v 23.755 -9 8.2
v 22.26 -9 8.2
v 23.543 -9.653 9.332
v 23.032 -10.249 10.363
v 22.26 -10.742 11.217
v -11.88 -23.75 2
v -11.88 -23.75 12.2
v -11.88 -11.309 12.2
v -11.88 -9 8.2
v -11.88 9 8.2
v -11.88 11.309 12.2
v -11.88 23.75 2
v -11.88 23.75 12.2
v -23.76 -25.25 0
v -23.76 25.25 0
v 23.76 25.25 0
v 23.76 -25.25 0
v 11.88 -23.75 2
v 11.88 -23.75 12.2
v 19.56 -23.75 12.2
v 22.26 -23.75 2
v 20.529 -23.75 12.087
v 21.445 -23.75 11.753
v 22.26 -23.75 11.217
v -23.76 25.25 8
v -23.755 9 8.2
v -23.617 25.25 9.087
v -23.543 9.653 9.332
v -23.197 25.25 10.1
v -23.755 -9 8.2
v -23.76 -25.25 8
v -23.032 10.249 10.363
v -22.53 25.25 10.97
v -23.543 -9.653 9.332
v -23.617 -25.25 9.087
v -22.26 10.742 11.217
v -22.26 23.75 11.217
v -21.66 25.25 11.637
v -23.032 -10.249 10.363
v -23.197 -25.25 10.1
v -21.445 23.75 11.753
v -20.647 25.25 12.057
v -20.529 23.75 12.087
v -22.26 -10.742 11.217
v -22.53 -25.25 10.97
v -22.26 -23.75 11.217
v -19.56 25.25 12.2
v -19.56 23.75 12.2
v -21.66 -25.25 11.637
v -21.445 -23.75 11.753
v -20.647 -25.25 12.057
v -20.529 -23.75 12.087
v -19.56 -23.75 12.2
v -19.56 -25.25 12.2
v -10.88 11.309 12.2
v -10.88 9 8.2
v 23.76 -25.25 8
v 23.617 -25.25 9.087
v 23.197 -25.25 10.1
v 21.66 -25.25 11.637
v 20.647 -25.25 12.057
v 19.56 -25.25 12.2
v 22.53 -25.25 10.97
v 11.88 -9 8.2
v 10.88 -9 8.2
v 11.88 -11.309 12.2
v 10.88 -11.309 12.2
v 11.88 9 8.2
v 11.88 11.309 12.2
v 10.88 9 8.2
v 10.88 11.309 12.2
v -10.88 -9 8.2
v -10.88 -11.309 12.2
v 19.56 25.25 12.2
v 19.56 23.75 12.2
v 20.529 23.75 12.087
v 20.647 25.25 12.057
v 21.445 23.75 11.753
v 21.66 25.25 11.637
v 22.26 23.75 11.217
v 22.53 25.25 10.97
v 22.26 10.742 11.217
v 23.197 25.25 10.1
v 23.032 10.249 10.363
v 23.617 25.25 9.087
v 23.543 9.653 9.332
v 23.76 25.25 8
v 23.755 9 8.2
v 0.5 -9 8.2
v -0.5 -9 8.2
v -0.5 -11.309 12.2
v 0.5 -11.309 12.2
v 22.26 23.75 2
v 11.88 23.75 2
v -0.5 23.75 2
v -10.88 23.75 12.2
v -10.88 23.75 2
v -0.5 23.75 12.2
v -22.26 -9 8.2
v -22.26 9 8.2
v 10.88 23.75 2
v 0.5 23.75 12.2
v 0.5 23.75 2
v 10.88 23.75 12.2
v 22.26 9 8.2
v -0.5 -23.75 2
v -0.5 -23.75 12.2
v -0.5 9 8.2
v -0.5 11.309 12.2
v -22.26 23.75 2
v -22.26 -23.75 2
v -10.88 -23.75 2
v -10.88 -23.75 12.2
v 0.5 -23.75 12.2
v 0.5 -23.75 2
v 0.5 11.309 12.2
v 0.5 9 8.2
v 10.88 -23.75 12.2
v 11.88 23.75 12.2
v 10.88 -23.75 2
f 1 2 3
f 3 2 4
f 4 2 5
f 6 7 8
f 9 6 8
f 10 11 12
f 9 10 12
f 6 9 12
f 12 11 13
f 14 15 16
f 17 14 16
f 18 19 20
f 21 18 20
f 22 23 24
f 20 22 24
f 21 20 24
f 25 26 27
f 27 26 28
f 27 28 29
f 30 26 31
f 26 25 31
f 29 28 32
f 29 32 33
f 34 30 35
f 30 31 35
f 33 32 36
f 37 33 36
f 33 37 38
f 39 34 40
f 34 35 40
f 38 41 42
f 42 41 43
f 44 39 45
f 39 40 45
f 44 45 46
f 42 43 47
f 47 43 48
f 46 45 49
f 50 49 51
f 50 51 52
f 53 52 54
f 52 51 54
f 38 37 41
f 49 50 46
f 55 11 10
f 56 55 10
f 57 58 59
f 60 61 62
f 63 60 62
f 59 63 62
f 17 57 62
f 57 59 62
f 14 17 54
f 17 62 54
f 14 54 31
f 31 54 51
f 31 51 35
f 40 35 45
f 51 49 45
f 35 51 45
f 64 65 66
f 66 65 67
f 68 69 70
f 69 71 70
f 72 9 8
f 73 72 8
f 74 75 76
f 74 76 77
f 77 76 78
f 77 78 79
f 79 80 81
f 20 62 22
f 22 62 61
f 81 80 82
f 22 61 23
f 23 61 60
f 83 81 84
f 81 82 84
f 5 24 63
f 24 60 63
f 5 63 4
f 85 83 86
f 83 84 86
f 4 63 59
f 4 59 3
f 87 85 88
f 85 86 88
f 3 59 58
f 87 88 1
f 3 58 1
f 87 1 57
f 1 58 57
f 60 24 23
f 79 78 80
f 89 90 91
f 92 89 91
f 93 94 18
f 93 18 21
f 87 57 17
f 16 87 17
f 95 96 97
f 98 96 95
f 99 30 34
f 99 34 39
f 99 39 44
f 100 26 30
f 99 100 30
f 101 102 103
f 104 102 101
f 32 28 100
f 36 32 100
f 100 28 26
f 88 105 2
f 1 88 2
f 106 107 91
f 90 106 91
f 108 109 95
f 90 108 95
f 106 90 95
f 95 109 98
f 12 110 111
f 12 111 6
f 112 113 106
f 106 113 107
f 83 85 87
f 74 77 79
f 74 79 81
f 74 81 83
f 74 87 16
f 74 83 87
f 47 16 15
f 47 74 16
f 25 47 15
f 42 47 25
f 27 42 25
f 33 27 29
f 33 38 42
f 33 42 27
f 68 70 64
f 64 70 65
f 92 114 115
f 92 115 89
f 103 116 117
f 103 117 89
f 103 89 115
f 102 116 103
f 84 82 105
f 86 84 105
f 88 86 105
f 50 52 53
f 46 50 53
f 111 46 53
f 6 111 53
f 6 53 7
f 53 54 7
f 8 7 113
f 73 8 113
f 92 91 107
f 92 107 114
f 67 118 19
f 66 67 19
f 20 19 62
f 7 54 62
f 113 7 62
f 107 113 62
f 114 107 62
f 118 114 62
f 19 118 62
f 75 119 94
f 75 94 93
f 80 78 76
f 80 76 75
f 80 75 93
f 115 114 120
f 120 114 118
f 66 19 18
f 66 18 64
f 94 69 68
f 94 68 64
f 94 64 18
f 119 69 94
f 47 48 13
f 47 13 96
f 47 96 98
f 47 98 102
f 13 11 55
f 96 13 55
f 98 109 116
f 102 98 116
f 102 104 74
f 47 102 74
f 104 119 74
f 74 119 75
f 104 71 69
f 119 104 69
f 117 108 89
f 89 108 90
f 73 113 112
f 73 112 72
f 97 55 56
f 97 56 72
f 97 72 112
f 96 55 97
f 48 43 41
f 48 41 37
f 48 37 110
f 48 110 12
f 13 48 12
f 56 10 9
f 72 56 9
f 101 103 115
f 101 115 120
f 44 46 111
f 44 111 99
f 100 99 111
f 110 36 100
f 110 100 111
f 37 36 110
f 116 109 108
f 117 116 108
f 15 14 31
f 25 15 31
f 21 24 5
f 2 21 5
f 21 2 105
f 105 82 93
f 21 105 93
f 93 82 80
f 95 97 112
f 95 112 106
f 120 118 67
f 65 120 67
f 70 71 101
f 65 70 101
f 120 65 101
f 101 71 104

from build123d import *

# Parameters (mm, degrees)
SKETCH1_W               = 47.52
SKETCH1_H               = 50.5
BOSS_EXTRUDE1_DEPTH     = 2
BOSS_EXTRUDE2_DEPTH     = 50.5
SKETCH3_W               = 10.38
SKETCH3_H               = 47.5
CUT_EXTRUDE1_DEPTH      = 10.2
CUT_EXTRUDE2_DEPTH      = 37.755137056
CUT_EXTRUDE2_DEPTH_BACK = 37.755137056


with BuildPart() as part:
    # Sketch1 → Boss-Extrude1 (new body)
    with BuildSketch(Plane.XY):
        Rectangle(SKETCH1_W, SKETCH1_H)
    extrude(amount=BOSS_EXTRUDE1_DEPTH)

    # Sketch2 → Boss-Extrude2 (add)
    with BuildSketch(Plane.XZ.offset(25.25)):
        with BuildLine():
            Line((-19.56, 12.2), (19.56, 12.2))
            ThreePointArc((19.56, 12.2), (22.529848481, 10.969848481), (23.76, 8))
            Line((23.76, 8), (23.76, 2))
            Line((23.76, 2), (-23.76, 2))
            Line((-23.76, 2), (-23.76, 8))
            ThreePointArc((-23.76, 8), (-22.529848481, 10.969848481), (-19.56, 12.2))
        make_face()
    extrude(amount=-BOSS_EXTRUDE2_DEPTH)

    # Sketch3 → Cut-Extrude1 (cut)
    with BuildSketch(Plane.XY.offset(12.2)):
        with Locations((-17.07, 0)):
            Rectangle(SKETCH3_W, SKETCH3_H)
        with Locations((-5.69, 0)):
            Rectangle(SKETCH3_W, SKETCH3_H)
        with Locations((5.69, 0)):
            Rectangle(SKETCH3_W, SKETCH3_H)
        with Locations((17.07, 0)):
            Rectangle(SKETCH3_W, SKETCH3_H)
    extrude(amount=-CUT_EXTRUDE1_DEPTH, mode=Mode.SUBTRACT)

    # Sketch4 → Cut-Extrude2 (cut, two sides: drawn at the far end of the back side and taken through both)
    with BuildSketch(Plane(origin=(0, 0, 0), x_dir=(0, 0, -1), z_dir=(1, 0, 0)).offset(-CUT_EXTRUDE2_DEPTH_BACK)):
        Polygon((-17.2, -14.196152423), (-17.2, 14.196152423), (-8.2, 9), (-8.2, -9), align=None)
    extrude(amount=CUT_EXTRUDE2_DEPTH + CUT_EXTRUDE2_DEPTH_BACK, mode=Mode.SUBTRACT)


solid = part.part
